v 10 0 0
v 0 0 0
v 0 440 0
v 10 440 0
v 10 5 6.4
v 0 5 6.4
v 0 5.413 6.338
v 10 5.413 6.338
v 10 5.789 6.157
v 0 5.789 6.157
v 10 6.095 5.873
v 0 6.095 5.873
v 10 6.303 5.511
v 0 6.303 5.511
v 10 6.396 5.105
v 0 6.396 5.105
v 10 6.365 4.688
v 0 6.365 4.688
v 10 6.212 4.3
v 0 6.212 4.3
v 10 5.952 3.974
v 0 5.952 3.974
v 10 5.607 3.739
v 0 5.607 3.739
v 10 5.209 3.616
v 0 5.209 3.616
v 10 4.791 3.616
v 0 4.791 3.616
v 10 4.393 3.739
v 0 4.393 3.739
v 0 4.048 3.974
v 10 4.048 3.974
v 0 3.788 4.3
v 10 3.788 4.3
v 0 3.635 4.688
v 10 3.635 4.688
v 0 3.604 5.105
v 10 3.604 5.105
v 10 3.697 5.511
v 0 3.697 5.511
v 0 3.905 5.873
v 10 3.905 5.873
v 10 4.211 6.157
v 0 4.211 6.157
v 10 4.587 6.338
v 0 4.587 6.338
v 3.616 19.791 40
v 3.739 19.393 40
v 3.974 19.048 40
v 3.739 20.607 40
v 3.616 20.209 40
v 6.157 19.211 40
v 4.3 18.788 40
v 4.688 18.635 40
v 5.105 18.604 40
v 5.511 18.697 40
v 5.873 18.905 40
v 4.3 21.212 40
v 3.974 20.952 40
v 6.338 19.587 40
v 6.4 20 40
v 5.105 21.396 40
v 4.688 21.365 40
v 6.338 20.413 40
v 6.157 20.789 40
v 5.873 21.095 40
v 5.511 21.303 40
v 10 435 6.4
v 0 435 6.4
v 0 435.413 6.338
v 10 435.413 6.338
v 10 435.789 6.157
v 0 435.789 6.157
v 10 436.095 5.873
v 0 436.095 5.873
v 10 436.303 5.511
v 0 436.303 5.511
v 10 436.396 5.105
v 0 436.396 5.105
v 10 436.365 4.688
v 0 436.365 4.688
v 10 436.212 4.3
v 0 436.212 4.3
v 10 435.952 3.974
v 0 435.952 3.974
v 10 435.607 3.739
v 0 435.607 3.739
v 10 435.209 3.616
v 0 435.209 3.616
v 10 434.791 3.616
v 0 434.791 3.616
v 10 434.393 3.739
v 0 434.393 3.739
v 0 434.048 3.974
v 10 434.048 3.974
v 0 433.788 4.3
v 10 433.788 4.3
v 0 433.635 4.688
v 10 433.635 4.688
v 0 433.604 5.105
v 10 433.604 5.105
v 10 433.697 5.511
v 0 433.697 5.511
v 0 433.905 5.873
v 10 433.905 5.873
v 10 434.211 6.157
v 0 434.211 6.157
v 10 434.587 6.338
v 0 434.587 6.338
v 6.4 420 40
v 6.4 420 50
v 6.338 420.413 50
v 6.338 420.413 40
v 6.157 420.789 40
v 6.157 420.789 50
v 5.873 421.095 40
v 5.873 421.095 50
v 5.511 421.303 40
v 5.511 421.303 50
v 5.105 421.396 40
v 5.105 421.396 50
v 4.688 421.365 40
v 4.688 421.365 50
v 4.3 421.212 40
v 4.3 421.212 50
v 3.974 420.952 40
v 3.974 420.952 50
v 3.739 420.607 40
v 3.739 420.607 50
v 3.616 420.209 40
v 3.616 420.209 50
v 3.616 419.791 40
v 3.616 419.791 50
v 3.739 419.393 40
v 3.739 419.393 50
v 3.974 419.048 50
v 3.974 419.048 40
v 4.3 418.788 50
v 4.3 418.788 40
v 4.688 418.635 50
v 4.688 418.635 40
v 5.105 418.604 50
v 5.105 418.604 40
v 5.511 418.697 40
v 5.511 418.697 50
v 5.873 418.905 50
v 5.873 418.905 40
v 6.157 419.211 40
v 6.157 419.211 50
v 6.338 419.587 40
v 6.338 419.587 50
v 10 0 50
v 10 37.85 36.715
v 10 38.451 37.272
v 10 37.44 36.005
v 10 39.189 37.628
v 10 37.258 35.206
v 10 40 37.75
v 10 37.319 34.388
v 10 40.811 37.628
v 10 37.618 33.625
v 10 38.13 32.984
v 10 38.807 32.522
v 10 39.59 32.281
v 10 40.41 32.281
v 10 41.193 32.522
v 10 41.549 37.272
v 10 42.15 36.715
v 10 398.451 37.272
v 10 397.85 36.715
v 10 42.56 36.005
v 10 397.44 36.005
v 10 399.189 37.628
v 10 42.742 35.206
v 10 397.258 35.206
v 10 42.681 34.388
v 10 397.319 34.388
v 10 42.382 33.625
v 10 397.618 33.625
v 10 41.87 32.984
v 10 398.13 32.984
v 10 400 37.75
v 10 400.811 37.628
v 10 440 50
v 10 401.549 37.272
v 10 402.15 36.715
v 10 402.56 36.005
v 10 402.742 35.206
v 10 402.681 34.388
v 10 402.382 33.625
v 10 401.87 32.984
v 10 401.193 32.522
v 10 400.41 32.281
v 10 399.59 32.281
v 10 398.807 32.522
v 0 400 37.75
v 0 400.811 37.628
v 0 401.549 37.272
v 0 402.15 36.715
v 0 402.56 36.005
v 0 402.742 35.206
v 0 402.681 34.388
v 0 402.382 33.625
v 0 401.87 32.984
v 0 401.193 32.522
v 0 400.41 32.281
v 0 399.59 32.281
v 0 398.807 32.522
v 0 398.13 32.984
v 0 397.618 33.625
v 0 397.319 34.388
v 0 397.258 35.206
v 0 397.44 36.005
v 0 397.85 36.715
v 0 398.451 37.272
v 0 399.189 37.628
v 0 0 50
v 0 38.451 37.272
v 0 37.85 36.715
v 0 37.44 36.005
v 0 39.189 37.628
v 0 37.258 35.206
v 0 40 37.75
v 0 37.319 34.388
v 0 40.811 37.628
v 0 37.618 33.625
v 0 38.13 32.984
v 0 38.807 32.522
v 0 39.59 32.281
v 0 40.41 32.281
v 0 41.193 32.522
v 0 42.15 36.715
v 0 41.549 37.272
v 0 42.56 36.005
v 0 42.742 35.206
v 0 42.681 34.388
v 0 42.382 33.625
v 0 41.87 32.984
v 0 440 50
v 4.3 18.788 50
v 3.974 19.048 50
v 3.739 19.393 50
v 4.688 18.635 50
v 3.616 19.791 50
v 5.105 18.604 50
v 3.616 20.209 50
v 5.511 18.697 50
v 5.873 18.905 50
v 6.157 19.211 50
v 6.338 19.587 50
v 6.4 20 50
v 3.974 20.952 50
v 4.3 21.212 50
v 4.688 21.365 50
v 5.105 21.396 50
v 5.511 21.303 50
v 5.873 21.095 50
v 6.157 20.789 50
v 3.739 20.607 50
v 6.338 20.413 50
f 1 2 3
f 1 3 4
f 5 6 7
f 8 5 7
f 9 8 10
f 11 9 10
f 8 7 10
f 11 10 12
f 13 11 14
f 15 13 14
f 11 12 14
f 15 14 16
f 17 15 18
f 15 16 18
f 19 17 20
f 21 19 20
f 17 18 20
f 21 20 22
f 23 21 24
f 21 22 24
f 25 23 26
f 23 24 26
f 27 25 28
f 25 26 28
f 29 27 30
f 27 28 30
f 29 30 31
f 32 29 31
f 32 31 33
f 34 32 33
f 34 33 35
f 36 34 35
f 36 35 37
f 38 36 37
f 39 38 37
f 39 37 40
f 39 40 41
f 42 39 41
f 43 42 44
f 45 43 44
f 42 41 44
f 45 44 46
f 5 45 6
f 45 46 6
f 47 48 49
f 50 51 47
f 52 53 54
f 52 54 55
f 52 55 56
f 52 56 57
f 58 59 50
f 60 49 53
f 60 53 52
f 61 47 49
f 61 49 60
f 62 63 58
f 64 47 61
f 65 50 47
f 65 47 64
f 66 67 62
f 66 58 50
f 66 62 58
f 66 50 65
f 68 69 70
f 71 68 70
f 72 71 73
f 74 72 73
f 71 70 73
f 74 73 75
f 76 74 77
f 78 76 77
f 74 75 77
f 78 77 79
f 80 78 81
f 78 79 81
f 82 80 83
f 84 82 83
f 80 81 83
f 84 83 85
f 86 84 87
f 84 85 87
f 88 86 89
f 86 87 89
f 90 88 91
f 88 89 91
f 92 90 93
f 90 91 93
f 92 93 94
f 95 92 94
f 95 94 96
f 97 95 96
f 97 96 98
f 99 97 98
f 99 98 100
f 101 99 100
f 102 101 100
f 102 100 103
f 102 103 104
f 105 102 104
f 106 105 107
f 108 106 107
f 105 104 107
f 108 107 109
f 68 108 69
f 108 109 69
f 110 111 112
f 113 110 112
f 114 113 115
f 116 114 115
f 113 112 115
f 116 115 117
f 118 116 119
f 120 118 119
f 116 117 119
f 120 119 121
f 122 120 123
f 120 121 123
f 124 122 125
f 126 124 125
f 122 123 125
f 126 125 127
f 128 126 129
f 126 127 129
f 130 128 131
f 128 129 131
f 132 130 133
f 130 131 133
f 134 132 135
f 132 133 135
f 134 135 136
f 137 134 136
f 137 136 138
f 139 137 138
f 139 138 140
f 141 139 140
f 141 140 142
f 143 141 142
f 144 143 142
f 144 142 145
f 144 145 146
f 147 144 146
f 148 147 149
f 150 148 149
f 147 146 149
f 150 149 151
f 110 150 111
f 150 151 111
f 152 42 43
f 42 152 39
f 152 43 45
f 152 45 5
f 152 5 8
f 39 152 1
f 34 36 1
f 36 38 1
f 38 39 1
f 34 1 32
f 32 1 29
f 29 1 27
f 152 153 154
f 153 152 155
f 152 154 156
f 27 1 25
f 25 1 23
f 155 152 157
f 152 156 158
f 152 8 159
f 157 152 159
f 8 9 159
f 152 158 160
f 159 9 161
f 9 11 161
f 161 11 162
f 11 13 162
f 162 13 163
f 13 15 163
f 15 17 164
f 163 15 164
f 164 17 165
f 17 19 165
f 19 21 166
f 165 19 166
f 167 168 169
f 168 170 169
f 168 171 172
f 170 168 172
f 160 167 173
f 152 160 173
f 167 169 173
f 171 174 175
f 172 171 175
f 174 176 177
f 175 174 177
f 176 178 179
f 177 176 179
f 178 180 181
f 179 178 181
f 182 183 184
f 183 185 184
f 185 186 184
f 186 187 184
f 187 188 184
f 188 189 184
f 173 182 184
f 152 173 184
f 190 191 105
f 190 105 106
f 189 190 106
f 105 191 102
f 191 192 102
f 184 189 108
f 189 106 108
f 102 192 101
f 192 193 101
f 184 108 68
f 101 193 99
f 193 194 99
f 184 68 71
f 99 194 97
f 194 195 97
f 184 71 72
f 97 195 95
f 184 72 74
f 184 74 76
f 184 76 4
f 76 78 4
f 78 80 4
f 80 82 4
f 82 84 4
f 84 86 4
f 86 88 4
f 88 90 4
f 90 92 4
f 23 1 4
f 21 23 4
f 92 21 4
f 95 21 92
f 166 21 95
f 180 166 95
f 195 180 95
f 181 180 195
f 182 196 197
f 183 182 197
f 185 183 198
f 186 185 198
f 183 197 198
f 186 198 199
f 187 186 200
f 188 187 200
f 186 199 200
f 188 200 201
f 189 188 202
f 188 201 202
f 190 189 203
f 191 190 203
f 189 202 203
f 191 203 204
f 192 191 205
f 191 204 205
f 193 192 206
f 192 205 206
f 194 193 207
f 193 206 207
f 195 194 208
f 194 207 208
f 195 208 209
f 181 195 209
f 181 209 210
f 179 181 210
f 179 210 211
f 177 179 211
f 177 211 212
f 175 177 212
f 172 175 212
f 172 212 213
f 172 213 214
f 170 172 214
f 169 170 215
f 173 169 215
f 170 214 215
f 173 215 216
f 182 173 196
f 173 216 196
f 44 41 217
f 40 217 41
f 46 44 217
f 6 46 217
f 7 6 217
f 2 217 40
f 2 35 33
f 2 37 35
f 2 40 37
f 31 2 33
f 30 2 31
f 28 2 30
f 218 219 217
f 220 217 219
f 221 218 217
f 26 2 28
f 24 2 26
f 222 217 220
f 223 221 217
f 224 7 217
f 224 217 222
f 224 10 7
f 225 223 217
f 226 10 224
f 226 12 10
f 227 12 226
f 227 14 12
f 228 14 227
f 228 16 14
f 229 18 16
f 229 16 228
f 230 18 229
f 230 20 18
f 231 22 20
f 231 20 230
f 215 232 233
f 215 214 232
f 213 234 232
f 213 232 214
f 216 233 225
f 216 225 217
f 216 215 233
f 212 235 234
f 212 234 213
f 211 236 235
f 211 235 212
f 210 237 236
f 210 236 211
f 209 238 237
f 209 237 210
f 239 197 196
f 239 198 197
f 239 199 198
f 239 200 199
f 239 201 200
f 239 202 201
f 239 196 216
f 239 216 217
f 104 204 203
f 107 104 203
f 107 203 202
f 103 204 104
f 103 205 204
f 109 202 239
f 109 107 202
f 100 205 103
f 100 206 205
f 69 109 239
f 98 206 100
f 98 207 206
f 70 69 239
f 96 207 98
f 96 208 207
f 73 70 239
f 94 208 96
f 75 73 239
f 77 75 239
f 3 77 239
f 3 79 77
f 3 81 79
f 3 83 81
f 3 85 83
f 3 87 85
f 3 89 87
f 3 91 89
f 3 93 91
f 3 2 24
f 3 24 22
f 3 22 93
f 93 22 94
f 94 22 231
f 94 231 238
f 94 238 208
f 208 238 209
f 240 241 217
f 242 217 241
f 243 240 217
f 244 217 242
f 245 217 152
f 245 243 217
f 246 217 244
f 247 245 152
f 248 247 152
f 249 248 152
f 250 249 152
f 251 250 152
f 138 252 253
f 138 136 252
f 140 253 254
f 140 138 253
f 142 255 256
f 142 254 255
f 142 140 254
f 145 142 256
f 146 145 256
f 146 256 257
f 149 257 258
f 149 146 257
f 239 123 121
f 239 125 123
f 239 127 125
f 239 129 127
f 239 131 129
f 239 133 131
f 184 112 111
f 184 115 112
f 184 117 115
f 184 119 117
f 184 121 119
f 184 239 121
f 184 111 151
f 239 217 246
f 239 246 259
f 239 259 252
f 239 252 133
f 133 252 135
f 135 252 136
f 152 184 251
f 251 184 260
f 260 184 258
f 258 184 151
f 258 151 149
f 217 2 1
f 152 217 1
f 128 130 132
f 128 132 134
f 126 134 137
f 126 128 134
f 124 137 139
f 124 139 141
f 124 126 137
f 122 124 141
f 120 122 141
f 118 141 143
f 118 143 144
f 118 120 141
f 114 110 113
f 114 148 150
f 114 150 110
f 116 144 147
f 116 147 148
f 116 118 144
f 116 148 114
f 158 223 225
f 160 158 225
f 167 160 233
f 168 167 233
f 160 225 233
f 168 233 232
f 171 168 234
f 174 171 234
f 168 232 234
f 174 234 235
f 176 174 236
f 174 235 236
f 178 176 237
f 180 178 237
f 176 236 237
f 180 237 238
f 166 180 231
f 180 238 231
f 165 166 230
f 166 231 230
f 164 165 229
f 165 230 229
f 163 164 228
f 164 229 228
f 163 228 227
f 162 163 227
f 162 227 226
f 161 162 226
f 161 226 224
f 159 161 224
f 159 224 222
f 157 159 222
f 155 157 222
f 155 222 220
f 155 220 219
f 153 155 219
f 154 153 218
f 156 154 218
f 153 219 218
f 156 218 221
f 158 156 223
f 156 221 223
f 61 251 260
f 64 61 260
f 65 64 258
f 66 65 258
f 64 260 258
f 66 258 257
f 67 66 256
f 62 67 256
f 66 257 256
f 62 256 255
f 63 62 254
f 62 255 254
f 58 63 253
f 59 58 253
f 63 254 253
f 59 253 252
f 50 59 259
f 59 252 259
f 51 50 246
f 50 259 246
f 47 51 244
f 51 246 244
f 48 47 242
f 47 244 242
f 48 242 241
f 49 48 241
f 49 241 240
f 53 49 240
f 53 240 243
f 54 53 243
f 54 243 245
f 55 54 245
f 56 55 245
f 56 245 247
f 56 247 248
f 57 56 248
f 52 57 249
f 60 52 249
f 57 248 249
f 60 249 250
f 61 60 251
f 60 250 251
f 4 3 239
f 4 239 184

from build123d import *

# Parameters (mm, degrees)
SKETCH3_W           = 10
SKETCH3_H           = 440
BOSS_EXTRUDE1_DEPTH = 50
SKETCH4_R           = 1.4
CUT_EXTRUDE2_DEPTH  = 10
SKETCH5_R           = 2.75
CUT_EXTRUDE3_DEPTH  = 10
SKETCH6_R           = 1.4
CUT_EXTRUDE4_DEPTH  = 10


with BuildPart() as part:
    # Sketch3 → Boss-Extrude1 (new body)
    with BuildSketch(Plane.XY):
        with Locations((5, 220)):
            Rectangle(SKETCH3_W, SKETCH3_H)
    extrude(amount=BOSS_EXTRUDE1_DEPTH)

    # Sketch4 → Cut-Extrude2 (cut)
    with BuildSketch(Plane.XY.offset(50)):
        with Locations((5, 420)):
            Circle(SKETCH4_R)
        with Locations((5, 20)):
            Circle(SKETCH4_R)
    extrude(amount=-CUT_EXTRUDE2_DEPTH, mode=Mode.SUBTRACT)

    # Sketch5 → Cut-Extrude3 (cut)
    with BuildSketch(Plane.ZY):
        with Locations((35, 400)):
            Circle(SKETCH5_R)
        with Locations((35, 40)):
            Circle(SKETCH5_R)
    extrude(amount=-CUT_EXTRUDE3_DEPTH, mode=Mode.SUBTRACT)

    # Sketch6 → Cut-Extrude4 (cut)
    with BuildSketch(Plane.ZY):
        with Locations((5, 435)):
            Circle(SKETCH6_R)
        with Locations((5, 5)):
            Circle(SKETCH6_R)
    extrude(amount=-CUT_EXTRUDE4_DEPTH, mode=Mode.SUBTRACT)


solid = part.part
